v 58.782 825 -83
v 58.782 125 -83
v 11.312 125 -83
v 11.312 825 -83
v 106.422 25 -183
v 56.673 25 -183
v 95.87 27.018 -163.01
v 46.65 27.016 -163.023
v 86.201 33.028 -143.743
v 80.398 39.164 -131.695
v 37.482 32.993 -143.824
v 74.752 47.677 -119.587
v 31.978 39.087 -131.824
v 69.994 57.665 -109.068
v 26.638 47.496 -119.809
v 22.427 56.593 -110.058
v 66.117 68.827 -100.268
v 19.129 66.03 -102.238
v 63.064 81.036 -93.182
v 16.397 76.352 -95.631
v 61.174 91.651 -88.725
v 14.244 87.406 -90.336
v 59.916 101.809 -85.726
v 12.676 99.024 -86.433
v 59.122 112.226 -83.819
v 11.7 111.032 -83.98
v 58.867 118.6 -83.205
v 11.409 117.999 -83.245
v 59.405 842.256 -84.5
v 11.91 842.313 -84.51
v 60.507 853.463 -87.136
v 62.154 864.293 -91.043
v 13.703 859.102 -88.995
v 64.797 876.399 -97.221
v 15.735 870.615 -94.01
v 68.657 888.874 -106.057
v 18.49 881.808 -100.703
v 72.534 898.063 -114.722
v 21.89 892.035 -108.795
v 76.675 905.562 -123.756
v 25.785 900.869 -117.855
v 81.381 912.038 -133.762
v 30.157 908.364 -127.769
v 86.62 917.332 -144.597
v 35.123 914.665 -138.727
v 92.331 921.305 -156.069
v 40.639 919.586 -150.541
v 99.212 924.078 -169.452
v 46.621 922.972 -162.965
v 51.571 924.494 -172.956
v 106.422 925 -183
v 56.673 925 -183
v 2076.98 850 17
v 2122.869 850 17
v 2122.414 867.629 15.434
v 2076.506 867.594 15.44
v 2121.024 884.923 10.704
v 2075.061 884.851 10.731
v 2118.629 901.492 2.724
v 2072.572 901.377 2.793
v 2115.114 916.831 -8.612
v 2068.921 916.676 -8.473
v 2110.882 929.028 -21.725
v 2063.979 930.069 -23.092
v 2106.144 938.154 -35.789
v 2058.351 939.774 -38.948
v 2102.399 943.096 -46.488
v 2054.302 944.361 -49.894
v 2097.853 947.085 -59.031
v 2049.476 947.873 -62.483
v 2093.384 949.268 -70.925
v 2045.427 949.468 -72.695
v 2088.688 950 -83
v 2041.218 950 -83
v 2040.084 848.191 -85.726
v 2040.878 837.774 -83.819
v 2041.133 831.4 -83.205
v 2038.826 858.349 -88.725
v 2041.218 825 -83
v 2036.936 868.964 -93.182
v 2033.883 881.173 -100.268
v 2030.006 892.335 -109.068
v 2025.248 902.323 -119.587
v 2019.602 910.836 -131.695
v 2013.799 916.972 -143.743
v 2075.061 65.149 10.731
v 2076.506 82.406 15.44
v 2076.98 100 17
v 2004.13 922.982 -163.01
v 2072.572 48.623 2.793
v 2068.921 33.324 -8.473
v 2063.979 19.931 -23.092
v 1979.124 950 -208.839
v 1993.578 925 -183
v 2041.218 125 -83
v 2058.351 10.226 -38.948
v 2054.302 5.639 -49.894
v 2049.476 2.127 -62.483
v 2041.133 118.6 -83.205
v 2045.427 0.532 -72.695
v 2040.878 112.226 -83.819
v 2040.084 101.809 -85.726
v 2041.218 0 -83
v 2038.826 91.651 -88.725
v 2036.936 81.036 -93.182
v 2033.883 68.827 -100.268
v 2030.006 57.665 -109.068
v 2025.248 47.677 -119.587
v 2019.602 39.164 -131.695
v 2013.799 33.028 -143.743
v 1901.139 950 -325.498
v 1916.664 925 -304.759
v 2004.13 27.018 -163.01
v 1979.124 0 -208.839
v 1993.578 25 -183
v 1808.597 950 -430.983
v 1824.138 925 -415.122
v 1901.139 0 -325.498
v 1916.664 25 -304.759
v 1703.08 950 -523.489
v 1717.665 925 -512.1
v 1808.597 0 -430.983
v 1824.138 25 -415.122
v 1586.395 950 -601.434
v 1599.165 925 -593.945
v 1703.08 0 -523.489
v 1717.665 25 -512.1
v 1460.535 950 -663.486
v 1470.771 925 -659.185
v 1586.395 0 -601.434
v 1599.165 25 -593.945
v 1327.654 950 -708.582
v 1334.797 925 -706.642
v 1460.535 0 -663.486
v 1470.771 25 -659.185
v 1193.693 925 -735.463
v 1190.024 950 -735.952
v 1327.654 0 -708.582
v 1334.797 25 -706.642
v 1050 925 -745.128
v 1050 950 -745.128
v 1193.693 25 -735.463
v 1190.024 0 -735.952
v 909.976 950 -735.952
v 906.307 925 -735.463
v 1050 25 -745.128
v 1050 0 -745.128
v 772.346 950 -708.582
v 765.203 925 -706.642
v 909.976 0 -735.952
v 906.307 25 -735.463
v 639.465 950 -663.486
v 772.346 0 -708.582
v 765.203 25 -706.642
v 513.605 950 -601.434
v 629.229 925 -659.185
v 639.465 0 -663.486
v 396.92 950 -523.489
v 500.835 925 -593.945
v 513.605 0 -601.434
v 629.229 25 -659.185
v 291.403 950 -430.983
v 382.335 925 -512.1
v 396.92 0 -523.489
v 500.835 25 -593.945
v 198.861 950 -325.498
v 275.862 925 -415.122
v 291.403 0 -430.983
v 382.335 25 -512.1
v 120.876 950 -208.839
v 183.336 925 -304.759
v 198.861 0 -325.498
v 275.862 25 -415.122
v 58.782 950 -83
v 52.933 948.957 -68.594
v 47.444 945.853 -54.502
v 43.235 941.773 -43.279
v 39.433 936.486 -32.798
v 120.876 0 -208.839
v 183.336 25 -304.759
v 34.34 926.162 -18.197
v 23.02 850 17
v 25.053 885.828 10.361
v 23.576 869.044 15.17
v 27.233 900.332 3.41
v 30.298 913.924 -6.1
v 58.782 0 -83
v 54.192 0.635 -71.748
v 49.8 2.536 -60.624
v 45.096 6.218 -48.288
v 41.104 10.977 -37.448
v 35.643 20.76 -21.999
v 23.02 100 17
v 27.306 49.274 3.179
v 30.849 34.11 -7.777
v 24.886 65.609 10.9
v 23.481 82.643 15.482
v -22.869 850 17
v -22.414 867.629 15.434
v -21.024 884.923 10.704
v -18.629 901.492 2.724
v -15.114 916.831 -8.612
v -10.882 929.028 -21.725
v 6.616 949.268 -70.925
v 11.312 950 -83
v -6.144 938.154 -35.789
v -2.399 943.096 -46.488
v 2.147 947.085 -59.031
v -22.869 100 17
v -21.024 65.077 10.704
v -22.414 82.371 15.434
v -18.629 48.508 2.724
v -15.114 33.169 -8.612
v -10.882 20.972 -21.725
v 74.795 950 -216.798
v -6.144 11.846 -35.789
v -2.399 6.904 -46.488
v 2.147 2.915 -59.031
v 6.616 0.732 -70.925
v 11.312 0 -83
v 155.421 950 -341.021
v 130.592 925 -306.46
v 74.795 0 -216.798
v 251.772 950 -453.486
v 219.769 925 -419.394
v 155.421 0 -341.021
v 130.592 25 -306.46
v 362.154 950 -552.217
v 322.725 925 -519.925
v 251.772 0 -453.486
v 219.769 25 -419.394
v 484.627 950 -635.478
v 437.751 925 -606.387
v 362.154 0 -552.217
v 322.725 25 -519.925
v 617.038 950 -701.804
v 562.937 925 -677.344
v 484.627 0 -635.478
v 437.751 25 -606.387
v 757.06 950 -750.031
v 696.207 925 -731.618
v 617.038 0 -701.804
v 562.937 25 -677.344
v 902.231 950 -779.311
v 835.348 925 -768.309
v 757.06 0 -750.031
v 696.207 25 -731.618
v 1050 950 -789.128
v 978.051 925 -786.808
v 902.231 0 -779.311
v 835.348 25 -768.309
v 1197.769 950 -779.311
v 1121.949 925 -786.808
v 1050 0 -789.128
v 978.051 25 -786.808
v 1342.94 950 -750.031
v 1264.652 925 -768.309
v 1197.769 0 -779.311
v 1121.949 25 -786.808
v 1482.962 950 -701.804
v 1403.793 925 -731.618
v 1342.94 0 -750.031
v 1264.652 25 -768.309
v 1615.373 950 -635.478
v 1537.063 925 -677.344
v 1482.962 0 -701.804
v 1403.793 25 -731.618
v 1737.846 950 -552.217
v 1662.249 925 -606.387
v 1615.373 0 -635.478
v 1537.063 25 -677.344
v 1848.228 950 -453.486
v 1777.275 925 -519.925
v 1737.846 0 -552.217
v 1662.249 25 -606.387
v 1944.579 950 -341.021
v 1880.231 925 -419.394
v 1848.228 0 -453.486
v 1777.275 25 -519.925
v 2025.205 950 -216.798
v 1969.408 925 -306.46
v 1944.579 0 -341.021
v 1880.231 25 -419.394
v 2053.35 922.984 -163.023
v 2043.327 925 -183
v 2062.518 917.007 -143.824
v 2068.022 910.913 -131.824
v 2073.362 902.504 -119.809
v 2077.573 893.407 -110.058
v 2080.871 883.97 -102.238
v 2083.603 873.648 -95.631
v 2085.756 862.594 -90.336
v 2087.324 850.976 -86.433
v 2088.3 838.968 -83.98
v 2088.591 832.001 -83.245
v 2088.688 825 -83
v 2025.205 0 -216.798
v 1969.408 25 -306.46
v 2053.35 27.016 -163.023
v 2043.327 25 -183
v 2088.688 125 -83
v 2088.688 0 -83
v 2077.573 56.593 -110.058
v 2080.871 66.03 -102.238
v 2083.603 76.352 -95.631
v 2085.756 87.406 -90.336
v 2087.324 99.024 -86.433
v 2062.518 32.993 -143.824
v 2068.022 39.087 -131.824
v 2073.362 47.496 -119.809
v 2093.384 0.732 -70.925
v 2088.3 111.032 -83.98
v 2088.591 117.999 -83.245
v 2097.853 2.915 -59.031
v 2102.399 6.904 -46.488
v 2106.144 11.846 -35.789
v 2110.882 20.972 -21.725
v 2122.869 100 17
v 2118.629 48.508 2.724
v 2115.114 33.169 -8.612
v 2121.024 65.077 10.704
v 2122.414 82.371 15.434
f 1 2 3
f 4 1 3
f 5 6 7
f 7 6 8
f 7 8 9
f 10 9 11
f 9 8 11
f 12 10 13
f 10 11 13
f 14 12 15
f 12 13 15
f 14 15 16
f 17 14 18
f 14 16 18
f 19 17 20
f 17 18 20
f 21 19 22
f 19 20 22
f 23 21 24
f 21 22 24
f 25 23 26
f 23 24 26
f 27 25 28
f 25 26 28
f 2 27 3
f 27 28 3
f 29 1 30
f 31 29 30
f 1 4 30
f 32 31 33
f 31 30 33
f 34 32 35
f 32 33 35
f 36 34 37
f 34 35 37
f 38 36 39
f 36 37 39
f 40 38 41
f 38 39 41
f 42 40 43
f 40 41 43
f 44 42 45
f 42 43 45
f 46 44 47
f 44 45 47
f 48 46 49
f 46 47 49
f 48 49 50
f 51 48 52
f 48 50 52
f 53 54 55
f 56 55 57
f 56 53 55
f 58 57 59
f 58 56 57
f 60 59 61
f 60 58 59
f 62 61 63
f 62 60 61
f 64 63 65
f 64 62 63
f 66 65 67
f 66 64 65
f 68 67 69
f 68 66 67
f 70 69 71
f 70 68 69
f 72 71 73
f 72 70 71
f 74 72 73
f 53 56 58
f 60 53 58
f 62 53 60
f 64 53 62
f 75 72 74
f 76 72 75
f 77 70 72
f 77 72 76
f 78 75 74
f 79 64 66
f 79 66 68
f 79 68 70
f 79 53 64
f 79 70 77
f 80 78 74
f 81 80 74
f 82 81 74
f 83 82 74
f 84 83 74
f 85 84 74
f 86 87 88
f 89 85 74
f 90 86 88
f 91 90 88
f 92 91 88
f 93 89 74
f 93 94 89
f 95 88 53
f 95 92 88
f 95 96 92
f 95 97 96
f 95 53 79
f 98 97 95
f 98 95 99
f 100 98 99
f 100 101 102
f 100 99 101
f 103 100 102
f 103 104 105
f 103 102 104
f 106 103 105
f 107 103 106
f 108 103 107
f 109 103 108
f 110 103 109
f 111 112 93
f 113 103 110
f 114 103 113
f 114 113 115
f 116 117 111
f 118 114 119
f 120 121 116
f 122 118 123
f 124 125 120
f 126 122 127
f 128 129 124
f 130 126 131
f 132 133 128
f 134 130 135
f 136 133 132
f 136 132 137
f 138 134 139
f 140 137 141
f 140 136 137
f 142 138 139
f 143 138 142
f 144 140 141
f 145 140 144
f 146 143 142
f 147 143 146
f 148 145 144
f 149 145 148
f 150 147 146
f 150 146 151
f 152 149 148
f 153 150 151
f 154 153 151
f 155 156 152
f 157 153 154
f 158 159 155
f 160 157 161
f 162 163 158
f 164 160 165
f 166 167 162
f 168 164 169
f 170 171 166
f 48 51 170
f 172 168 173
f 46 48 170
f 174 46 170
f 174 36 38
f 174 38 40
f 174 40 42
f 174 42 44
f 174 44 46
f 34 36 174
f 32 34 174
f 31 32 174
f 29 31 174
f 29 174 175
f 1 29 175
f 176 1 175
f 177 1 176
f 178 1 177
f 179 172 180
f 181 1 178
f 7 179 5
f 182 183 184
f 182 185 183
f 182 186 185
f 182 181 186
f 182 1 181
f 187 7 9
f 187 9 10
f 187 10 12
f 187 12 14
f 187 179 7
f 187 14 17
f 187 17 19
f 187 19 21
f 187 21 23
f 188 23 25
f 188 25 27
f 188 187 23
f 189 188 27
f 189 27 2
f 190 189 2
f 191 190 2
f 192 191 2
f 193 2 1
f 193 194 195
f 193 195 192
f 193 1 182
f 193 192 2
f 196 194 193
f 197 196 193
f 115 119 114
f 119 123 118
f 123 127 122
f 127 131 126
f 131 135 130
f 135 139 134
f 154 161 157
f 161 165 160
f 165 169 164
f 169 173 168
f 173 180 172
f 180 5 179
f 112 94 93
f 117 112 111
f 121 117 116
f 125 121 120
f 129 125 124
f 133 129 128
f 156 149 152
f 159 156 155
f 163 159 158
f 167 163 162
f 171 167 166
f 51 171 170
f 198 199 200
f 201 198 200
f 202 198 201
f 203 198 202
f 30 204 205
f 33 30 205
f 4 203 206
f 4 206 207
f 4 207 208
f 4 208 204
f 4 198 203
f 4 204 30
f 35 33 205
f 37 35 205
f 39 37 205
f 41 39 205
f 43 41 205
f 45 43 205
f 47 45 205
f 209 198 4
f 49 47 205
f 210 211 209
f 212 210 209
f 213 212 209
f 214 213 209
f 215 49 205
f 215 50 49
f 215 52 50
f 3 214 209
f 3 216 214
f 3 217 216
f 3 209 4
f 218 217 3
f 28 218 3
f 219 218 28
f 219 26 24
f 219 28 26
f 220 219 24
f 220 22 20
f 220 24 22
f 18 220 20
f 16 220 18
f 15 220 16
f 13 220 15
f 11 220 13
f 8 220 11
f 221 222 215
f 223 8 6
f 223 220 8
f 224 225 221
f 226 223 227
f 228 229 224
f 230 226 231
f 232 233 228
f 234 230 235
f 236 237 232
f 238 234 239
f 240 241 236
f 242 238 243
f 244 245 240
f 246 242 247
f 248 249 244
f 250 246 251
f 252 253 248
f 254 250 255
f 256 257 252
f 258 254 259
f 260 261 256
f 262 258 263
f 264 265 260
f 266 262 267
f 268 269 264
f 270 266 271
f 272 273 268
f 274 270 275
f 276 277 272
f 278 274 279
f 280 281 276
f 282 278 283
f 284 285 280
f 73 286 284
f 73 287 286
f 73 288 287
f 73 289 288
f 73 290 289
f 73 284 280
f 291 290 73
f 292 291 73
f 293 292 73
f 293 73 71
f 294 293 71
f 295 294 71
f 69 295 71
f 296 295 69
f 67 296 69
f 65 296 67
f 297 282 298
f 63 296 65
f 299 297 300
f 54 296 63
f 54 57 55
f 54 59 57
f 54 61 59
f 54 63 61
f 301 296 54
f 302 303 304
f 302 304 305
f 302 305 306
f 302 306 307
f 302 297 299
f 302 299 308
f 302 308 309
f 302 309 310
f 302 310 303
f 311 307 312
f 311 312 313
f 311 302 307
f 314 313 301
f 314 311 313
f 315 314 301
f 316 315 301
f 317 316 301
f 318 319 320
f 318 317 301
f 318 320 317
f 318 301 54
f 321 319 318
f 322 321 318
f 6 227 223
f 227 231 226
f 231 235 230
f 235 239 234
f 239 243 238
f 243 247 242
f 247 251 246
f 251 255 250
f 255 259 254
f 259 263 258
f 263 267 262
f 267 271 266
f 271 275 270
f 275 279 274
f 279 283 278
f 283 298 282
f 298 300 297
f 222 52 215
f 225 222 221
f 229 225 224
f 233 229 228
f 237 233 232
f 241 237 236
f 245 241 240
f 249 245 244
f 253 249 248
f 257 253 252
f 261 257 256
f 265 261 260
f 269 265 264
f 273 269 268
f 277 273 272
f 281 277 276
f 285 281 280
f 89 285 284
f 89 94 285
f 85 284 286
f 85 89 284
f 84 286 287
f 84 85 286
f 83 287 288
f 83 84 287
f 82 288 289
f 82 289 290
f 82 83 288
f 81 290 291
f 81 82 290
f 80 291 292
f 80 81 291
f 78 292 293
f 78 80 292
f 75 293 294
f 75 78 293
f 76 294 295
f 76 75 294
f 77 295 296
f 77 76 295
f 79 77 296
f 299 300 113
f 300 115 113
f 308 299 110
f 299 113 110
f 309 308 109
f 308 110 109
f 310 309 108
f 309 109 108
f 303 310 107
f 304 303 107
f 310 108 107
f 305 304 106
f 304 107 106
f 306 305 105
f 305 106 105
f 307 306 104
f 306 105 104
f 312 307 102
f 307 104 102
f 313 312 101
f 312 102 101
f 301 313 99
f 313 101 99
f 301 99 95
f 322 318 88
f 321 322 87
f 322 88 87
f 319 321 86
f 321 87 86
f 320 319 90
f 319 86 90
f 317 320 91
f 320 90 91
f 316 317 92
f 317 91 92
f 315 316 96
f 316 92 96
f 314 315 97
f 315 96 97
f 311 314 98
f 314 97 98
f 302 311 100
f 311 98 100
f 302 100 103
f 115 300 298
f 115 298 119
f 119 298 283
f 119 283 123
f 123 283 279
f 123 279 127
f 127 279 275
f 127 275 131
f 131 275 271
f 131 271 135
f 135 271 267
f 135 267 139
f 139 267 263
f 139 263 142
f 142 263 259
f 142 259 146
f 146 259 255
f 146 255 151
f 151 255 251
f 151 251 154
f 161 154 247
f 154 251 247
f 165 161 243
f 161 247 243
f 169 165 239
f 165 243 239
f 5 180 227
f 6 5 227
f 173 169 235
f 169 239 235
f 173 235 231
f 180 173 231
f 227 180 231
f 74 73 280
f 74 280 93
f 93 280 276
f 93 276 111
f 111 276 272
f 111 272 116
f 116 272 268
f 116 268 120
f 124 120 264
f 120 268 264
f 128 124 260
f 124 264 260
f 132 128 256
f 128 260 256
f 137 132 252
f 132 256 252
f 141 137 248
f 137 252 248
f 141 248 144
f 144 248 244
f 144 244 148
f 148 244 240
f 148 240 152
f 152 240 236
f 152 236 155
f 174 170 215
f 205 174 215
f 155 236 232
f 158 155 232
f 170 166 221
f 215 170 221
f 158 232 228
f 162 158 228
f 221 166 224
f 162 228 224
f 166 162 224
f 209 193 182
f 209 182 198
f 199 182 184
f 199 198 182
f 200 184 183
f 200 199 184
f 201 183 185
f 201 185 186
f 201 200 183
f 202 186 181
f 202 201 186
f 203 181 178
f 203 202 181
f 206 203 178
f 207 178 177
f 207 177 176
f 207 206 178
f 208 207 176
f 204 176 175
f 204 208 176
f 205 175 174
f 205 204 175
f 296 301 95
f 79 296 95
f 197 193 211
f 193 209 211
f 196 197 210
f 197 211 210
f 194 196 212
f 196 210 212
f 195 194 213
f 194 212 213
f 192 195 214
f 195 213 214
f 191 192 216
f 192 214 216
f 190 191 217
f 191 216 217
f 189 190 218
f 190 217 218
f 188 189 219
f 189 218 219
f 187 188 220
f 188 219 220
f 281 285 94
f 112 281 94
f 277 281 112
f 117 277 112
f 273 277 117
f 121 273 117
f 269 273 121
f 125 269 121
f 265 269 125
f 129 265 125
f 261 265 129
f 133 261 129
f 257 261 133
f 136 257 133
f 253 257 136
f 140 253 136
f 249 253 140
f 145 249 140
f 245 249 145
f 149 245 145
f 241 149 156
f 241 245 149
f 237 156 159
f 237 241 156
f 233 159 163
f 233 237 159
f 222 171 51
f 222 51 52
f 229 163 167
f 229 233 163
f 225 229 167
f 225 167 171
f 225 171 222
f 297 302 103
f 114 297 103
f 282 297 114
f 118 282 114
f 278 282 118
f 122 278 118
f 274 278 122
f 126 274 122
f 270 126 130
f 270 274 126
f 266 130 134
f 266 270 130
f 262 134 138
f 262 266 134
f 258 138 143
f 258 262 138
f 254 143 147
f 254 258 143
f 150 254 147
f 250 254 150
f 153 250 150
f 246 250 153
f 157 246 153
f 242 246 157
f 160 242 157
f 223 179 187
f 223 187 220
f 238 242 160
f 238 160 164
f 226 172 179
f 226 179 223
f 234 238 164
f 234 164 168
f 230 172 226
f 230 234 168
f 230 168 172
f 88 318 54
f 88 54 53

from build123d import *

# Parameters (mm, degrees)
BOSS_EXTRUDE2_DEPTH = 950
FILLET2_R           = 100
CUT_EXTRUDE3_DEPTH  = 900
FILLET3_R           = 100


with BuildPart() as part:
    # Sketch2 → Boss-Extrude2 (new body)
    with BuildSketch(Plane(origin=(0, 0, 0), x_dir=(1, 0, 0), z_dir=(0, 1, 0))):
        with BuildLine():
            Line((2122.868885508, -17), (2076.979866157, -17))
            ThreePointArc((2076.979866157, -17), (1050, 745.128073785), (23.020133843, -17))
            Line((23.020133843, -17), (-22.868885508, -17))
            ThreePointArc((-22.868885508, -17), (1050, 789.128073785), (2122.868885508, -17))
        make_face()
    extrude(amount=BOSS_EXTRUDE2_DEPTH)

    # Fillet2
    fillet2_edges = [part.edges().sort_by_distance(p)[0] for p in [
        (2099.924375832, 950, 17),
        (0.075624168, 950, 17),
        (2099.924375832, 0, 17),
        (0.075624168, 0, 17),
    ]]
    fillet(fillet2_edges, radius=FILLET2_R)

    # Sketch4 → Cut-Extrude3 (cut)
    with BuildSketch(Plane(origin=(0, 25, 0), x_dir=(-1, 0, 0), z_dir=(0, -1, 0))):
        with BuildLine():
            Line((-2088.688240161, 83), (-2041.218068968, 83))
            ThreePointArc((-2041.218068968, 83), (-1050, 745.128073785), (-58.781931032, 83))
            Line((-58.781931032, 83), (-11.311759839, 83))
            ThreePointArc((-11.311759839, 83), (-1050, 789.128073785), (-2088.688240161, 83))
        make_face()
    extrude(amount=-CUT_EXTRUDE3_DEPTH, mode=Mode.SUBTRACT)

    # Fillet3
    fillet3_edges = [part.edges().sort_by_distance(p)[0] for p in [
        (35.046845436, 925, -83),
        (2064.953154564, 925, -83),
        (2064.953154564, 25, -83),
        (35.046845436, 25, -83),
    ]]
    fillet(fillet3_edges, radius=FILLET3_R)


solid = part.part
